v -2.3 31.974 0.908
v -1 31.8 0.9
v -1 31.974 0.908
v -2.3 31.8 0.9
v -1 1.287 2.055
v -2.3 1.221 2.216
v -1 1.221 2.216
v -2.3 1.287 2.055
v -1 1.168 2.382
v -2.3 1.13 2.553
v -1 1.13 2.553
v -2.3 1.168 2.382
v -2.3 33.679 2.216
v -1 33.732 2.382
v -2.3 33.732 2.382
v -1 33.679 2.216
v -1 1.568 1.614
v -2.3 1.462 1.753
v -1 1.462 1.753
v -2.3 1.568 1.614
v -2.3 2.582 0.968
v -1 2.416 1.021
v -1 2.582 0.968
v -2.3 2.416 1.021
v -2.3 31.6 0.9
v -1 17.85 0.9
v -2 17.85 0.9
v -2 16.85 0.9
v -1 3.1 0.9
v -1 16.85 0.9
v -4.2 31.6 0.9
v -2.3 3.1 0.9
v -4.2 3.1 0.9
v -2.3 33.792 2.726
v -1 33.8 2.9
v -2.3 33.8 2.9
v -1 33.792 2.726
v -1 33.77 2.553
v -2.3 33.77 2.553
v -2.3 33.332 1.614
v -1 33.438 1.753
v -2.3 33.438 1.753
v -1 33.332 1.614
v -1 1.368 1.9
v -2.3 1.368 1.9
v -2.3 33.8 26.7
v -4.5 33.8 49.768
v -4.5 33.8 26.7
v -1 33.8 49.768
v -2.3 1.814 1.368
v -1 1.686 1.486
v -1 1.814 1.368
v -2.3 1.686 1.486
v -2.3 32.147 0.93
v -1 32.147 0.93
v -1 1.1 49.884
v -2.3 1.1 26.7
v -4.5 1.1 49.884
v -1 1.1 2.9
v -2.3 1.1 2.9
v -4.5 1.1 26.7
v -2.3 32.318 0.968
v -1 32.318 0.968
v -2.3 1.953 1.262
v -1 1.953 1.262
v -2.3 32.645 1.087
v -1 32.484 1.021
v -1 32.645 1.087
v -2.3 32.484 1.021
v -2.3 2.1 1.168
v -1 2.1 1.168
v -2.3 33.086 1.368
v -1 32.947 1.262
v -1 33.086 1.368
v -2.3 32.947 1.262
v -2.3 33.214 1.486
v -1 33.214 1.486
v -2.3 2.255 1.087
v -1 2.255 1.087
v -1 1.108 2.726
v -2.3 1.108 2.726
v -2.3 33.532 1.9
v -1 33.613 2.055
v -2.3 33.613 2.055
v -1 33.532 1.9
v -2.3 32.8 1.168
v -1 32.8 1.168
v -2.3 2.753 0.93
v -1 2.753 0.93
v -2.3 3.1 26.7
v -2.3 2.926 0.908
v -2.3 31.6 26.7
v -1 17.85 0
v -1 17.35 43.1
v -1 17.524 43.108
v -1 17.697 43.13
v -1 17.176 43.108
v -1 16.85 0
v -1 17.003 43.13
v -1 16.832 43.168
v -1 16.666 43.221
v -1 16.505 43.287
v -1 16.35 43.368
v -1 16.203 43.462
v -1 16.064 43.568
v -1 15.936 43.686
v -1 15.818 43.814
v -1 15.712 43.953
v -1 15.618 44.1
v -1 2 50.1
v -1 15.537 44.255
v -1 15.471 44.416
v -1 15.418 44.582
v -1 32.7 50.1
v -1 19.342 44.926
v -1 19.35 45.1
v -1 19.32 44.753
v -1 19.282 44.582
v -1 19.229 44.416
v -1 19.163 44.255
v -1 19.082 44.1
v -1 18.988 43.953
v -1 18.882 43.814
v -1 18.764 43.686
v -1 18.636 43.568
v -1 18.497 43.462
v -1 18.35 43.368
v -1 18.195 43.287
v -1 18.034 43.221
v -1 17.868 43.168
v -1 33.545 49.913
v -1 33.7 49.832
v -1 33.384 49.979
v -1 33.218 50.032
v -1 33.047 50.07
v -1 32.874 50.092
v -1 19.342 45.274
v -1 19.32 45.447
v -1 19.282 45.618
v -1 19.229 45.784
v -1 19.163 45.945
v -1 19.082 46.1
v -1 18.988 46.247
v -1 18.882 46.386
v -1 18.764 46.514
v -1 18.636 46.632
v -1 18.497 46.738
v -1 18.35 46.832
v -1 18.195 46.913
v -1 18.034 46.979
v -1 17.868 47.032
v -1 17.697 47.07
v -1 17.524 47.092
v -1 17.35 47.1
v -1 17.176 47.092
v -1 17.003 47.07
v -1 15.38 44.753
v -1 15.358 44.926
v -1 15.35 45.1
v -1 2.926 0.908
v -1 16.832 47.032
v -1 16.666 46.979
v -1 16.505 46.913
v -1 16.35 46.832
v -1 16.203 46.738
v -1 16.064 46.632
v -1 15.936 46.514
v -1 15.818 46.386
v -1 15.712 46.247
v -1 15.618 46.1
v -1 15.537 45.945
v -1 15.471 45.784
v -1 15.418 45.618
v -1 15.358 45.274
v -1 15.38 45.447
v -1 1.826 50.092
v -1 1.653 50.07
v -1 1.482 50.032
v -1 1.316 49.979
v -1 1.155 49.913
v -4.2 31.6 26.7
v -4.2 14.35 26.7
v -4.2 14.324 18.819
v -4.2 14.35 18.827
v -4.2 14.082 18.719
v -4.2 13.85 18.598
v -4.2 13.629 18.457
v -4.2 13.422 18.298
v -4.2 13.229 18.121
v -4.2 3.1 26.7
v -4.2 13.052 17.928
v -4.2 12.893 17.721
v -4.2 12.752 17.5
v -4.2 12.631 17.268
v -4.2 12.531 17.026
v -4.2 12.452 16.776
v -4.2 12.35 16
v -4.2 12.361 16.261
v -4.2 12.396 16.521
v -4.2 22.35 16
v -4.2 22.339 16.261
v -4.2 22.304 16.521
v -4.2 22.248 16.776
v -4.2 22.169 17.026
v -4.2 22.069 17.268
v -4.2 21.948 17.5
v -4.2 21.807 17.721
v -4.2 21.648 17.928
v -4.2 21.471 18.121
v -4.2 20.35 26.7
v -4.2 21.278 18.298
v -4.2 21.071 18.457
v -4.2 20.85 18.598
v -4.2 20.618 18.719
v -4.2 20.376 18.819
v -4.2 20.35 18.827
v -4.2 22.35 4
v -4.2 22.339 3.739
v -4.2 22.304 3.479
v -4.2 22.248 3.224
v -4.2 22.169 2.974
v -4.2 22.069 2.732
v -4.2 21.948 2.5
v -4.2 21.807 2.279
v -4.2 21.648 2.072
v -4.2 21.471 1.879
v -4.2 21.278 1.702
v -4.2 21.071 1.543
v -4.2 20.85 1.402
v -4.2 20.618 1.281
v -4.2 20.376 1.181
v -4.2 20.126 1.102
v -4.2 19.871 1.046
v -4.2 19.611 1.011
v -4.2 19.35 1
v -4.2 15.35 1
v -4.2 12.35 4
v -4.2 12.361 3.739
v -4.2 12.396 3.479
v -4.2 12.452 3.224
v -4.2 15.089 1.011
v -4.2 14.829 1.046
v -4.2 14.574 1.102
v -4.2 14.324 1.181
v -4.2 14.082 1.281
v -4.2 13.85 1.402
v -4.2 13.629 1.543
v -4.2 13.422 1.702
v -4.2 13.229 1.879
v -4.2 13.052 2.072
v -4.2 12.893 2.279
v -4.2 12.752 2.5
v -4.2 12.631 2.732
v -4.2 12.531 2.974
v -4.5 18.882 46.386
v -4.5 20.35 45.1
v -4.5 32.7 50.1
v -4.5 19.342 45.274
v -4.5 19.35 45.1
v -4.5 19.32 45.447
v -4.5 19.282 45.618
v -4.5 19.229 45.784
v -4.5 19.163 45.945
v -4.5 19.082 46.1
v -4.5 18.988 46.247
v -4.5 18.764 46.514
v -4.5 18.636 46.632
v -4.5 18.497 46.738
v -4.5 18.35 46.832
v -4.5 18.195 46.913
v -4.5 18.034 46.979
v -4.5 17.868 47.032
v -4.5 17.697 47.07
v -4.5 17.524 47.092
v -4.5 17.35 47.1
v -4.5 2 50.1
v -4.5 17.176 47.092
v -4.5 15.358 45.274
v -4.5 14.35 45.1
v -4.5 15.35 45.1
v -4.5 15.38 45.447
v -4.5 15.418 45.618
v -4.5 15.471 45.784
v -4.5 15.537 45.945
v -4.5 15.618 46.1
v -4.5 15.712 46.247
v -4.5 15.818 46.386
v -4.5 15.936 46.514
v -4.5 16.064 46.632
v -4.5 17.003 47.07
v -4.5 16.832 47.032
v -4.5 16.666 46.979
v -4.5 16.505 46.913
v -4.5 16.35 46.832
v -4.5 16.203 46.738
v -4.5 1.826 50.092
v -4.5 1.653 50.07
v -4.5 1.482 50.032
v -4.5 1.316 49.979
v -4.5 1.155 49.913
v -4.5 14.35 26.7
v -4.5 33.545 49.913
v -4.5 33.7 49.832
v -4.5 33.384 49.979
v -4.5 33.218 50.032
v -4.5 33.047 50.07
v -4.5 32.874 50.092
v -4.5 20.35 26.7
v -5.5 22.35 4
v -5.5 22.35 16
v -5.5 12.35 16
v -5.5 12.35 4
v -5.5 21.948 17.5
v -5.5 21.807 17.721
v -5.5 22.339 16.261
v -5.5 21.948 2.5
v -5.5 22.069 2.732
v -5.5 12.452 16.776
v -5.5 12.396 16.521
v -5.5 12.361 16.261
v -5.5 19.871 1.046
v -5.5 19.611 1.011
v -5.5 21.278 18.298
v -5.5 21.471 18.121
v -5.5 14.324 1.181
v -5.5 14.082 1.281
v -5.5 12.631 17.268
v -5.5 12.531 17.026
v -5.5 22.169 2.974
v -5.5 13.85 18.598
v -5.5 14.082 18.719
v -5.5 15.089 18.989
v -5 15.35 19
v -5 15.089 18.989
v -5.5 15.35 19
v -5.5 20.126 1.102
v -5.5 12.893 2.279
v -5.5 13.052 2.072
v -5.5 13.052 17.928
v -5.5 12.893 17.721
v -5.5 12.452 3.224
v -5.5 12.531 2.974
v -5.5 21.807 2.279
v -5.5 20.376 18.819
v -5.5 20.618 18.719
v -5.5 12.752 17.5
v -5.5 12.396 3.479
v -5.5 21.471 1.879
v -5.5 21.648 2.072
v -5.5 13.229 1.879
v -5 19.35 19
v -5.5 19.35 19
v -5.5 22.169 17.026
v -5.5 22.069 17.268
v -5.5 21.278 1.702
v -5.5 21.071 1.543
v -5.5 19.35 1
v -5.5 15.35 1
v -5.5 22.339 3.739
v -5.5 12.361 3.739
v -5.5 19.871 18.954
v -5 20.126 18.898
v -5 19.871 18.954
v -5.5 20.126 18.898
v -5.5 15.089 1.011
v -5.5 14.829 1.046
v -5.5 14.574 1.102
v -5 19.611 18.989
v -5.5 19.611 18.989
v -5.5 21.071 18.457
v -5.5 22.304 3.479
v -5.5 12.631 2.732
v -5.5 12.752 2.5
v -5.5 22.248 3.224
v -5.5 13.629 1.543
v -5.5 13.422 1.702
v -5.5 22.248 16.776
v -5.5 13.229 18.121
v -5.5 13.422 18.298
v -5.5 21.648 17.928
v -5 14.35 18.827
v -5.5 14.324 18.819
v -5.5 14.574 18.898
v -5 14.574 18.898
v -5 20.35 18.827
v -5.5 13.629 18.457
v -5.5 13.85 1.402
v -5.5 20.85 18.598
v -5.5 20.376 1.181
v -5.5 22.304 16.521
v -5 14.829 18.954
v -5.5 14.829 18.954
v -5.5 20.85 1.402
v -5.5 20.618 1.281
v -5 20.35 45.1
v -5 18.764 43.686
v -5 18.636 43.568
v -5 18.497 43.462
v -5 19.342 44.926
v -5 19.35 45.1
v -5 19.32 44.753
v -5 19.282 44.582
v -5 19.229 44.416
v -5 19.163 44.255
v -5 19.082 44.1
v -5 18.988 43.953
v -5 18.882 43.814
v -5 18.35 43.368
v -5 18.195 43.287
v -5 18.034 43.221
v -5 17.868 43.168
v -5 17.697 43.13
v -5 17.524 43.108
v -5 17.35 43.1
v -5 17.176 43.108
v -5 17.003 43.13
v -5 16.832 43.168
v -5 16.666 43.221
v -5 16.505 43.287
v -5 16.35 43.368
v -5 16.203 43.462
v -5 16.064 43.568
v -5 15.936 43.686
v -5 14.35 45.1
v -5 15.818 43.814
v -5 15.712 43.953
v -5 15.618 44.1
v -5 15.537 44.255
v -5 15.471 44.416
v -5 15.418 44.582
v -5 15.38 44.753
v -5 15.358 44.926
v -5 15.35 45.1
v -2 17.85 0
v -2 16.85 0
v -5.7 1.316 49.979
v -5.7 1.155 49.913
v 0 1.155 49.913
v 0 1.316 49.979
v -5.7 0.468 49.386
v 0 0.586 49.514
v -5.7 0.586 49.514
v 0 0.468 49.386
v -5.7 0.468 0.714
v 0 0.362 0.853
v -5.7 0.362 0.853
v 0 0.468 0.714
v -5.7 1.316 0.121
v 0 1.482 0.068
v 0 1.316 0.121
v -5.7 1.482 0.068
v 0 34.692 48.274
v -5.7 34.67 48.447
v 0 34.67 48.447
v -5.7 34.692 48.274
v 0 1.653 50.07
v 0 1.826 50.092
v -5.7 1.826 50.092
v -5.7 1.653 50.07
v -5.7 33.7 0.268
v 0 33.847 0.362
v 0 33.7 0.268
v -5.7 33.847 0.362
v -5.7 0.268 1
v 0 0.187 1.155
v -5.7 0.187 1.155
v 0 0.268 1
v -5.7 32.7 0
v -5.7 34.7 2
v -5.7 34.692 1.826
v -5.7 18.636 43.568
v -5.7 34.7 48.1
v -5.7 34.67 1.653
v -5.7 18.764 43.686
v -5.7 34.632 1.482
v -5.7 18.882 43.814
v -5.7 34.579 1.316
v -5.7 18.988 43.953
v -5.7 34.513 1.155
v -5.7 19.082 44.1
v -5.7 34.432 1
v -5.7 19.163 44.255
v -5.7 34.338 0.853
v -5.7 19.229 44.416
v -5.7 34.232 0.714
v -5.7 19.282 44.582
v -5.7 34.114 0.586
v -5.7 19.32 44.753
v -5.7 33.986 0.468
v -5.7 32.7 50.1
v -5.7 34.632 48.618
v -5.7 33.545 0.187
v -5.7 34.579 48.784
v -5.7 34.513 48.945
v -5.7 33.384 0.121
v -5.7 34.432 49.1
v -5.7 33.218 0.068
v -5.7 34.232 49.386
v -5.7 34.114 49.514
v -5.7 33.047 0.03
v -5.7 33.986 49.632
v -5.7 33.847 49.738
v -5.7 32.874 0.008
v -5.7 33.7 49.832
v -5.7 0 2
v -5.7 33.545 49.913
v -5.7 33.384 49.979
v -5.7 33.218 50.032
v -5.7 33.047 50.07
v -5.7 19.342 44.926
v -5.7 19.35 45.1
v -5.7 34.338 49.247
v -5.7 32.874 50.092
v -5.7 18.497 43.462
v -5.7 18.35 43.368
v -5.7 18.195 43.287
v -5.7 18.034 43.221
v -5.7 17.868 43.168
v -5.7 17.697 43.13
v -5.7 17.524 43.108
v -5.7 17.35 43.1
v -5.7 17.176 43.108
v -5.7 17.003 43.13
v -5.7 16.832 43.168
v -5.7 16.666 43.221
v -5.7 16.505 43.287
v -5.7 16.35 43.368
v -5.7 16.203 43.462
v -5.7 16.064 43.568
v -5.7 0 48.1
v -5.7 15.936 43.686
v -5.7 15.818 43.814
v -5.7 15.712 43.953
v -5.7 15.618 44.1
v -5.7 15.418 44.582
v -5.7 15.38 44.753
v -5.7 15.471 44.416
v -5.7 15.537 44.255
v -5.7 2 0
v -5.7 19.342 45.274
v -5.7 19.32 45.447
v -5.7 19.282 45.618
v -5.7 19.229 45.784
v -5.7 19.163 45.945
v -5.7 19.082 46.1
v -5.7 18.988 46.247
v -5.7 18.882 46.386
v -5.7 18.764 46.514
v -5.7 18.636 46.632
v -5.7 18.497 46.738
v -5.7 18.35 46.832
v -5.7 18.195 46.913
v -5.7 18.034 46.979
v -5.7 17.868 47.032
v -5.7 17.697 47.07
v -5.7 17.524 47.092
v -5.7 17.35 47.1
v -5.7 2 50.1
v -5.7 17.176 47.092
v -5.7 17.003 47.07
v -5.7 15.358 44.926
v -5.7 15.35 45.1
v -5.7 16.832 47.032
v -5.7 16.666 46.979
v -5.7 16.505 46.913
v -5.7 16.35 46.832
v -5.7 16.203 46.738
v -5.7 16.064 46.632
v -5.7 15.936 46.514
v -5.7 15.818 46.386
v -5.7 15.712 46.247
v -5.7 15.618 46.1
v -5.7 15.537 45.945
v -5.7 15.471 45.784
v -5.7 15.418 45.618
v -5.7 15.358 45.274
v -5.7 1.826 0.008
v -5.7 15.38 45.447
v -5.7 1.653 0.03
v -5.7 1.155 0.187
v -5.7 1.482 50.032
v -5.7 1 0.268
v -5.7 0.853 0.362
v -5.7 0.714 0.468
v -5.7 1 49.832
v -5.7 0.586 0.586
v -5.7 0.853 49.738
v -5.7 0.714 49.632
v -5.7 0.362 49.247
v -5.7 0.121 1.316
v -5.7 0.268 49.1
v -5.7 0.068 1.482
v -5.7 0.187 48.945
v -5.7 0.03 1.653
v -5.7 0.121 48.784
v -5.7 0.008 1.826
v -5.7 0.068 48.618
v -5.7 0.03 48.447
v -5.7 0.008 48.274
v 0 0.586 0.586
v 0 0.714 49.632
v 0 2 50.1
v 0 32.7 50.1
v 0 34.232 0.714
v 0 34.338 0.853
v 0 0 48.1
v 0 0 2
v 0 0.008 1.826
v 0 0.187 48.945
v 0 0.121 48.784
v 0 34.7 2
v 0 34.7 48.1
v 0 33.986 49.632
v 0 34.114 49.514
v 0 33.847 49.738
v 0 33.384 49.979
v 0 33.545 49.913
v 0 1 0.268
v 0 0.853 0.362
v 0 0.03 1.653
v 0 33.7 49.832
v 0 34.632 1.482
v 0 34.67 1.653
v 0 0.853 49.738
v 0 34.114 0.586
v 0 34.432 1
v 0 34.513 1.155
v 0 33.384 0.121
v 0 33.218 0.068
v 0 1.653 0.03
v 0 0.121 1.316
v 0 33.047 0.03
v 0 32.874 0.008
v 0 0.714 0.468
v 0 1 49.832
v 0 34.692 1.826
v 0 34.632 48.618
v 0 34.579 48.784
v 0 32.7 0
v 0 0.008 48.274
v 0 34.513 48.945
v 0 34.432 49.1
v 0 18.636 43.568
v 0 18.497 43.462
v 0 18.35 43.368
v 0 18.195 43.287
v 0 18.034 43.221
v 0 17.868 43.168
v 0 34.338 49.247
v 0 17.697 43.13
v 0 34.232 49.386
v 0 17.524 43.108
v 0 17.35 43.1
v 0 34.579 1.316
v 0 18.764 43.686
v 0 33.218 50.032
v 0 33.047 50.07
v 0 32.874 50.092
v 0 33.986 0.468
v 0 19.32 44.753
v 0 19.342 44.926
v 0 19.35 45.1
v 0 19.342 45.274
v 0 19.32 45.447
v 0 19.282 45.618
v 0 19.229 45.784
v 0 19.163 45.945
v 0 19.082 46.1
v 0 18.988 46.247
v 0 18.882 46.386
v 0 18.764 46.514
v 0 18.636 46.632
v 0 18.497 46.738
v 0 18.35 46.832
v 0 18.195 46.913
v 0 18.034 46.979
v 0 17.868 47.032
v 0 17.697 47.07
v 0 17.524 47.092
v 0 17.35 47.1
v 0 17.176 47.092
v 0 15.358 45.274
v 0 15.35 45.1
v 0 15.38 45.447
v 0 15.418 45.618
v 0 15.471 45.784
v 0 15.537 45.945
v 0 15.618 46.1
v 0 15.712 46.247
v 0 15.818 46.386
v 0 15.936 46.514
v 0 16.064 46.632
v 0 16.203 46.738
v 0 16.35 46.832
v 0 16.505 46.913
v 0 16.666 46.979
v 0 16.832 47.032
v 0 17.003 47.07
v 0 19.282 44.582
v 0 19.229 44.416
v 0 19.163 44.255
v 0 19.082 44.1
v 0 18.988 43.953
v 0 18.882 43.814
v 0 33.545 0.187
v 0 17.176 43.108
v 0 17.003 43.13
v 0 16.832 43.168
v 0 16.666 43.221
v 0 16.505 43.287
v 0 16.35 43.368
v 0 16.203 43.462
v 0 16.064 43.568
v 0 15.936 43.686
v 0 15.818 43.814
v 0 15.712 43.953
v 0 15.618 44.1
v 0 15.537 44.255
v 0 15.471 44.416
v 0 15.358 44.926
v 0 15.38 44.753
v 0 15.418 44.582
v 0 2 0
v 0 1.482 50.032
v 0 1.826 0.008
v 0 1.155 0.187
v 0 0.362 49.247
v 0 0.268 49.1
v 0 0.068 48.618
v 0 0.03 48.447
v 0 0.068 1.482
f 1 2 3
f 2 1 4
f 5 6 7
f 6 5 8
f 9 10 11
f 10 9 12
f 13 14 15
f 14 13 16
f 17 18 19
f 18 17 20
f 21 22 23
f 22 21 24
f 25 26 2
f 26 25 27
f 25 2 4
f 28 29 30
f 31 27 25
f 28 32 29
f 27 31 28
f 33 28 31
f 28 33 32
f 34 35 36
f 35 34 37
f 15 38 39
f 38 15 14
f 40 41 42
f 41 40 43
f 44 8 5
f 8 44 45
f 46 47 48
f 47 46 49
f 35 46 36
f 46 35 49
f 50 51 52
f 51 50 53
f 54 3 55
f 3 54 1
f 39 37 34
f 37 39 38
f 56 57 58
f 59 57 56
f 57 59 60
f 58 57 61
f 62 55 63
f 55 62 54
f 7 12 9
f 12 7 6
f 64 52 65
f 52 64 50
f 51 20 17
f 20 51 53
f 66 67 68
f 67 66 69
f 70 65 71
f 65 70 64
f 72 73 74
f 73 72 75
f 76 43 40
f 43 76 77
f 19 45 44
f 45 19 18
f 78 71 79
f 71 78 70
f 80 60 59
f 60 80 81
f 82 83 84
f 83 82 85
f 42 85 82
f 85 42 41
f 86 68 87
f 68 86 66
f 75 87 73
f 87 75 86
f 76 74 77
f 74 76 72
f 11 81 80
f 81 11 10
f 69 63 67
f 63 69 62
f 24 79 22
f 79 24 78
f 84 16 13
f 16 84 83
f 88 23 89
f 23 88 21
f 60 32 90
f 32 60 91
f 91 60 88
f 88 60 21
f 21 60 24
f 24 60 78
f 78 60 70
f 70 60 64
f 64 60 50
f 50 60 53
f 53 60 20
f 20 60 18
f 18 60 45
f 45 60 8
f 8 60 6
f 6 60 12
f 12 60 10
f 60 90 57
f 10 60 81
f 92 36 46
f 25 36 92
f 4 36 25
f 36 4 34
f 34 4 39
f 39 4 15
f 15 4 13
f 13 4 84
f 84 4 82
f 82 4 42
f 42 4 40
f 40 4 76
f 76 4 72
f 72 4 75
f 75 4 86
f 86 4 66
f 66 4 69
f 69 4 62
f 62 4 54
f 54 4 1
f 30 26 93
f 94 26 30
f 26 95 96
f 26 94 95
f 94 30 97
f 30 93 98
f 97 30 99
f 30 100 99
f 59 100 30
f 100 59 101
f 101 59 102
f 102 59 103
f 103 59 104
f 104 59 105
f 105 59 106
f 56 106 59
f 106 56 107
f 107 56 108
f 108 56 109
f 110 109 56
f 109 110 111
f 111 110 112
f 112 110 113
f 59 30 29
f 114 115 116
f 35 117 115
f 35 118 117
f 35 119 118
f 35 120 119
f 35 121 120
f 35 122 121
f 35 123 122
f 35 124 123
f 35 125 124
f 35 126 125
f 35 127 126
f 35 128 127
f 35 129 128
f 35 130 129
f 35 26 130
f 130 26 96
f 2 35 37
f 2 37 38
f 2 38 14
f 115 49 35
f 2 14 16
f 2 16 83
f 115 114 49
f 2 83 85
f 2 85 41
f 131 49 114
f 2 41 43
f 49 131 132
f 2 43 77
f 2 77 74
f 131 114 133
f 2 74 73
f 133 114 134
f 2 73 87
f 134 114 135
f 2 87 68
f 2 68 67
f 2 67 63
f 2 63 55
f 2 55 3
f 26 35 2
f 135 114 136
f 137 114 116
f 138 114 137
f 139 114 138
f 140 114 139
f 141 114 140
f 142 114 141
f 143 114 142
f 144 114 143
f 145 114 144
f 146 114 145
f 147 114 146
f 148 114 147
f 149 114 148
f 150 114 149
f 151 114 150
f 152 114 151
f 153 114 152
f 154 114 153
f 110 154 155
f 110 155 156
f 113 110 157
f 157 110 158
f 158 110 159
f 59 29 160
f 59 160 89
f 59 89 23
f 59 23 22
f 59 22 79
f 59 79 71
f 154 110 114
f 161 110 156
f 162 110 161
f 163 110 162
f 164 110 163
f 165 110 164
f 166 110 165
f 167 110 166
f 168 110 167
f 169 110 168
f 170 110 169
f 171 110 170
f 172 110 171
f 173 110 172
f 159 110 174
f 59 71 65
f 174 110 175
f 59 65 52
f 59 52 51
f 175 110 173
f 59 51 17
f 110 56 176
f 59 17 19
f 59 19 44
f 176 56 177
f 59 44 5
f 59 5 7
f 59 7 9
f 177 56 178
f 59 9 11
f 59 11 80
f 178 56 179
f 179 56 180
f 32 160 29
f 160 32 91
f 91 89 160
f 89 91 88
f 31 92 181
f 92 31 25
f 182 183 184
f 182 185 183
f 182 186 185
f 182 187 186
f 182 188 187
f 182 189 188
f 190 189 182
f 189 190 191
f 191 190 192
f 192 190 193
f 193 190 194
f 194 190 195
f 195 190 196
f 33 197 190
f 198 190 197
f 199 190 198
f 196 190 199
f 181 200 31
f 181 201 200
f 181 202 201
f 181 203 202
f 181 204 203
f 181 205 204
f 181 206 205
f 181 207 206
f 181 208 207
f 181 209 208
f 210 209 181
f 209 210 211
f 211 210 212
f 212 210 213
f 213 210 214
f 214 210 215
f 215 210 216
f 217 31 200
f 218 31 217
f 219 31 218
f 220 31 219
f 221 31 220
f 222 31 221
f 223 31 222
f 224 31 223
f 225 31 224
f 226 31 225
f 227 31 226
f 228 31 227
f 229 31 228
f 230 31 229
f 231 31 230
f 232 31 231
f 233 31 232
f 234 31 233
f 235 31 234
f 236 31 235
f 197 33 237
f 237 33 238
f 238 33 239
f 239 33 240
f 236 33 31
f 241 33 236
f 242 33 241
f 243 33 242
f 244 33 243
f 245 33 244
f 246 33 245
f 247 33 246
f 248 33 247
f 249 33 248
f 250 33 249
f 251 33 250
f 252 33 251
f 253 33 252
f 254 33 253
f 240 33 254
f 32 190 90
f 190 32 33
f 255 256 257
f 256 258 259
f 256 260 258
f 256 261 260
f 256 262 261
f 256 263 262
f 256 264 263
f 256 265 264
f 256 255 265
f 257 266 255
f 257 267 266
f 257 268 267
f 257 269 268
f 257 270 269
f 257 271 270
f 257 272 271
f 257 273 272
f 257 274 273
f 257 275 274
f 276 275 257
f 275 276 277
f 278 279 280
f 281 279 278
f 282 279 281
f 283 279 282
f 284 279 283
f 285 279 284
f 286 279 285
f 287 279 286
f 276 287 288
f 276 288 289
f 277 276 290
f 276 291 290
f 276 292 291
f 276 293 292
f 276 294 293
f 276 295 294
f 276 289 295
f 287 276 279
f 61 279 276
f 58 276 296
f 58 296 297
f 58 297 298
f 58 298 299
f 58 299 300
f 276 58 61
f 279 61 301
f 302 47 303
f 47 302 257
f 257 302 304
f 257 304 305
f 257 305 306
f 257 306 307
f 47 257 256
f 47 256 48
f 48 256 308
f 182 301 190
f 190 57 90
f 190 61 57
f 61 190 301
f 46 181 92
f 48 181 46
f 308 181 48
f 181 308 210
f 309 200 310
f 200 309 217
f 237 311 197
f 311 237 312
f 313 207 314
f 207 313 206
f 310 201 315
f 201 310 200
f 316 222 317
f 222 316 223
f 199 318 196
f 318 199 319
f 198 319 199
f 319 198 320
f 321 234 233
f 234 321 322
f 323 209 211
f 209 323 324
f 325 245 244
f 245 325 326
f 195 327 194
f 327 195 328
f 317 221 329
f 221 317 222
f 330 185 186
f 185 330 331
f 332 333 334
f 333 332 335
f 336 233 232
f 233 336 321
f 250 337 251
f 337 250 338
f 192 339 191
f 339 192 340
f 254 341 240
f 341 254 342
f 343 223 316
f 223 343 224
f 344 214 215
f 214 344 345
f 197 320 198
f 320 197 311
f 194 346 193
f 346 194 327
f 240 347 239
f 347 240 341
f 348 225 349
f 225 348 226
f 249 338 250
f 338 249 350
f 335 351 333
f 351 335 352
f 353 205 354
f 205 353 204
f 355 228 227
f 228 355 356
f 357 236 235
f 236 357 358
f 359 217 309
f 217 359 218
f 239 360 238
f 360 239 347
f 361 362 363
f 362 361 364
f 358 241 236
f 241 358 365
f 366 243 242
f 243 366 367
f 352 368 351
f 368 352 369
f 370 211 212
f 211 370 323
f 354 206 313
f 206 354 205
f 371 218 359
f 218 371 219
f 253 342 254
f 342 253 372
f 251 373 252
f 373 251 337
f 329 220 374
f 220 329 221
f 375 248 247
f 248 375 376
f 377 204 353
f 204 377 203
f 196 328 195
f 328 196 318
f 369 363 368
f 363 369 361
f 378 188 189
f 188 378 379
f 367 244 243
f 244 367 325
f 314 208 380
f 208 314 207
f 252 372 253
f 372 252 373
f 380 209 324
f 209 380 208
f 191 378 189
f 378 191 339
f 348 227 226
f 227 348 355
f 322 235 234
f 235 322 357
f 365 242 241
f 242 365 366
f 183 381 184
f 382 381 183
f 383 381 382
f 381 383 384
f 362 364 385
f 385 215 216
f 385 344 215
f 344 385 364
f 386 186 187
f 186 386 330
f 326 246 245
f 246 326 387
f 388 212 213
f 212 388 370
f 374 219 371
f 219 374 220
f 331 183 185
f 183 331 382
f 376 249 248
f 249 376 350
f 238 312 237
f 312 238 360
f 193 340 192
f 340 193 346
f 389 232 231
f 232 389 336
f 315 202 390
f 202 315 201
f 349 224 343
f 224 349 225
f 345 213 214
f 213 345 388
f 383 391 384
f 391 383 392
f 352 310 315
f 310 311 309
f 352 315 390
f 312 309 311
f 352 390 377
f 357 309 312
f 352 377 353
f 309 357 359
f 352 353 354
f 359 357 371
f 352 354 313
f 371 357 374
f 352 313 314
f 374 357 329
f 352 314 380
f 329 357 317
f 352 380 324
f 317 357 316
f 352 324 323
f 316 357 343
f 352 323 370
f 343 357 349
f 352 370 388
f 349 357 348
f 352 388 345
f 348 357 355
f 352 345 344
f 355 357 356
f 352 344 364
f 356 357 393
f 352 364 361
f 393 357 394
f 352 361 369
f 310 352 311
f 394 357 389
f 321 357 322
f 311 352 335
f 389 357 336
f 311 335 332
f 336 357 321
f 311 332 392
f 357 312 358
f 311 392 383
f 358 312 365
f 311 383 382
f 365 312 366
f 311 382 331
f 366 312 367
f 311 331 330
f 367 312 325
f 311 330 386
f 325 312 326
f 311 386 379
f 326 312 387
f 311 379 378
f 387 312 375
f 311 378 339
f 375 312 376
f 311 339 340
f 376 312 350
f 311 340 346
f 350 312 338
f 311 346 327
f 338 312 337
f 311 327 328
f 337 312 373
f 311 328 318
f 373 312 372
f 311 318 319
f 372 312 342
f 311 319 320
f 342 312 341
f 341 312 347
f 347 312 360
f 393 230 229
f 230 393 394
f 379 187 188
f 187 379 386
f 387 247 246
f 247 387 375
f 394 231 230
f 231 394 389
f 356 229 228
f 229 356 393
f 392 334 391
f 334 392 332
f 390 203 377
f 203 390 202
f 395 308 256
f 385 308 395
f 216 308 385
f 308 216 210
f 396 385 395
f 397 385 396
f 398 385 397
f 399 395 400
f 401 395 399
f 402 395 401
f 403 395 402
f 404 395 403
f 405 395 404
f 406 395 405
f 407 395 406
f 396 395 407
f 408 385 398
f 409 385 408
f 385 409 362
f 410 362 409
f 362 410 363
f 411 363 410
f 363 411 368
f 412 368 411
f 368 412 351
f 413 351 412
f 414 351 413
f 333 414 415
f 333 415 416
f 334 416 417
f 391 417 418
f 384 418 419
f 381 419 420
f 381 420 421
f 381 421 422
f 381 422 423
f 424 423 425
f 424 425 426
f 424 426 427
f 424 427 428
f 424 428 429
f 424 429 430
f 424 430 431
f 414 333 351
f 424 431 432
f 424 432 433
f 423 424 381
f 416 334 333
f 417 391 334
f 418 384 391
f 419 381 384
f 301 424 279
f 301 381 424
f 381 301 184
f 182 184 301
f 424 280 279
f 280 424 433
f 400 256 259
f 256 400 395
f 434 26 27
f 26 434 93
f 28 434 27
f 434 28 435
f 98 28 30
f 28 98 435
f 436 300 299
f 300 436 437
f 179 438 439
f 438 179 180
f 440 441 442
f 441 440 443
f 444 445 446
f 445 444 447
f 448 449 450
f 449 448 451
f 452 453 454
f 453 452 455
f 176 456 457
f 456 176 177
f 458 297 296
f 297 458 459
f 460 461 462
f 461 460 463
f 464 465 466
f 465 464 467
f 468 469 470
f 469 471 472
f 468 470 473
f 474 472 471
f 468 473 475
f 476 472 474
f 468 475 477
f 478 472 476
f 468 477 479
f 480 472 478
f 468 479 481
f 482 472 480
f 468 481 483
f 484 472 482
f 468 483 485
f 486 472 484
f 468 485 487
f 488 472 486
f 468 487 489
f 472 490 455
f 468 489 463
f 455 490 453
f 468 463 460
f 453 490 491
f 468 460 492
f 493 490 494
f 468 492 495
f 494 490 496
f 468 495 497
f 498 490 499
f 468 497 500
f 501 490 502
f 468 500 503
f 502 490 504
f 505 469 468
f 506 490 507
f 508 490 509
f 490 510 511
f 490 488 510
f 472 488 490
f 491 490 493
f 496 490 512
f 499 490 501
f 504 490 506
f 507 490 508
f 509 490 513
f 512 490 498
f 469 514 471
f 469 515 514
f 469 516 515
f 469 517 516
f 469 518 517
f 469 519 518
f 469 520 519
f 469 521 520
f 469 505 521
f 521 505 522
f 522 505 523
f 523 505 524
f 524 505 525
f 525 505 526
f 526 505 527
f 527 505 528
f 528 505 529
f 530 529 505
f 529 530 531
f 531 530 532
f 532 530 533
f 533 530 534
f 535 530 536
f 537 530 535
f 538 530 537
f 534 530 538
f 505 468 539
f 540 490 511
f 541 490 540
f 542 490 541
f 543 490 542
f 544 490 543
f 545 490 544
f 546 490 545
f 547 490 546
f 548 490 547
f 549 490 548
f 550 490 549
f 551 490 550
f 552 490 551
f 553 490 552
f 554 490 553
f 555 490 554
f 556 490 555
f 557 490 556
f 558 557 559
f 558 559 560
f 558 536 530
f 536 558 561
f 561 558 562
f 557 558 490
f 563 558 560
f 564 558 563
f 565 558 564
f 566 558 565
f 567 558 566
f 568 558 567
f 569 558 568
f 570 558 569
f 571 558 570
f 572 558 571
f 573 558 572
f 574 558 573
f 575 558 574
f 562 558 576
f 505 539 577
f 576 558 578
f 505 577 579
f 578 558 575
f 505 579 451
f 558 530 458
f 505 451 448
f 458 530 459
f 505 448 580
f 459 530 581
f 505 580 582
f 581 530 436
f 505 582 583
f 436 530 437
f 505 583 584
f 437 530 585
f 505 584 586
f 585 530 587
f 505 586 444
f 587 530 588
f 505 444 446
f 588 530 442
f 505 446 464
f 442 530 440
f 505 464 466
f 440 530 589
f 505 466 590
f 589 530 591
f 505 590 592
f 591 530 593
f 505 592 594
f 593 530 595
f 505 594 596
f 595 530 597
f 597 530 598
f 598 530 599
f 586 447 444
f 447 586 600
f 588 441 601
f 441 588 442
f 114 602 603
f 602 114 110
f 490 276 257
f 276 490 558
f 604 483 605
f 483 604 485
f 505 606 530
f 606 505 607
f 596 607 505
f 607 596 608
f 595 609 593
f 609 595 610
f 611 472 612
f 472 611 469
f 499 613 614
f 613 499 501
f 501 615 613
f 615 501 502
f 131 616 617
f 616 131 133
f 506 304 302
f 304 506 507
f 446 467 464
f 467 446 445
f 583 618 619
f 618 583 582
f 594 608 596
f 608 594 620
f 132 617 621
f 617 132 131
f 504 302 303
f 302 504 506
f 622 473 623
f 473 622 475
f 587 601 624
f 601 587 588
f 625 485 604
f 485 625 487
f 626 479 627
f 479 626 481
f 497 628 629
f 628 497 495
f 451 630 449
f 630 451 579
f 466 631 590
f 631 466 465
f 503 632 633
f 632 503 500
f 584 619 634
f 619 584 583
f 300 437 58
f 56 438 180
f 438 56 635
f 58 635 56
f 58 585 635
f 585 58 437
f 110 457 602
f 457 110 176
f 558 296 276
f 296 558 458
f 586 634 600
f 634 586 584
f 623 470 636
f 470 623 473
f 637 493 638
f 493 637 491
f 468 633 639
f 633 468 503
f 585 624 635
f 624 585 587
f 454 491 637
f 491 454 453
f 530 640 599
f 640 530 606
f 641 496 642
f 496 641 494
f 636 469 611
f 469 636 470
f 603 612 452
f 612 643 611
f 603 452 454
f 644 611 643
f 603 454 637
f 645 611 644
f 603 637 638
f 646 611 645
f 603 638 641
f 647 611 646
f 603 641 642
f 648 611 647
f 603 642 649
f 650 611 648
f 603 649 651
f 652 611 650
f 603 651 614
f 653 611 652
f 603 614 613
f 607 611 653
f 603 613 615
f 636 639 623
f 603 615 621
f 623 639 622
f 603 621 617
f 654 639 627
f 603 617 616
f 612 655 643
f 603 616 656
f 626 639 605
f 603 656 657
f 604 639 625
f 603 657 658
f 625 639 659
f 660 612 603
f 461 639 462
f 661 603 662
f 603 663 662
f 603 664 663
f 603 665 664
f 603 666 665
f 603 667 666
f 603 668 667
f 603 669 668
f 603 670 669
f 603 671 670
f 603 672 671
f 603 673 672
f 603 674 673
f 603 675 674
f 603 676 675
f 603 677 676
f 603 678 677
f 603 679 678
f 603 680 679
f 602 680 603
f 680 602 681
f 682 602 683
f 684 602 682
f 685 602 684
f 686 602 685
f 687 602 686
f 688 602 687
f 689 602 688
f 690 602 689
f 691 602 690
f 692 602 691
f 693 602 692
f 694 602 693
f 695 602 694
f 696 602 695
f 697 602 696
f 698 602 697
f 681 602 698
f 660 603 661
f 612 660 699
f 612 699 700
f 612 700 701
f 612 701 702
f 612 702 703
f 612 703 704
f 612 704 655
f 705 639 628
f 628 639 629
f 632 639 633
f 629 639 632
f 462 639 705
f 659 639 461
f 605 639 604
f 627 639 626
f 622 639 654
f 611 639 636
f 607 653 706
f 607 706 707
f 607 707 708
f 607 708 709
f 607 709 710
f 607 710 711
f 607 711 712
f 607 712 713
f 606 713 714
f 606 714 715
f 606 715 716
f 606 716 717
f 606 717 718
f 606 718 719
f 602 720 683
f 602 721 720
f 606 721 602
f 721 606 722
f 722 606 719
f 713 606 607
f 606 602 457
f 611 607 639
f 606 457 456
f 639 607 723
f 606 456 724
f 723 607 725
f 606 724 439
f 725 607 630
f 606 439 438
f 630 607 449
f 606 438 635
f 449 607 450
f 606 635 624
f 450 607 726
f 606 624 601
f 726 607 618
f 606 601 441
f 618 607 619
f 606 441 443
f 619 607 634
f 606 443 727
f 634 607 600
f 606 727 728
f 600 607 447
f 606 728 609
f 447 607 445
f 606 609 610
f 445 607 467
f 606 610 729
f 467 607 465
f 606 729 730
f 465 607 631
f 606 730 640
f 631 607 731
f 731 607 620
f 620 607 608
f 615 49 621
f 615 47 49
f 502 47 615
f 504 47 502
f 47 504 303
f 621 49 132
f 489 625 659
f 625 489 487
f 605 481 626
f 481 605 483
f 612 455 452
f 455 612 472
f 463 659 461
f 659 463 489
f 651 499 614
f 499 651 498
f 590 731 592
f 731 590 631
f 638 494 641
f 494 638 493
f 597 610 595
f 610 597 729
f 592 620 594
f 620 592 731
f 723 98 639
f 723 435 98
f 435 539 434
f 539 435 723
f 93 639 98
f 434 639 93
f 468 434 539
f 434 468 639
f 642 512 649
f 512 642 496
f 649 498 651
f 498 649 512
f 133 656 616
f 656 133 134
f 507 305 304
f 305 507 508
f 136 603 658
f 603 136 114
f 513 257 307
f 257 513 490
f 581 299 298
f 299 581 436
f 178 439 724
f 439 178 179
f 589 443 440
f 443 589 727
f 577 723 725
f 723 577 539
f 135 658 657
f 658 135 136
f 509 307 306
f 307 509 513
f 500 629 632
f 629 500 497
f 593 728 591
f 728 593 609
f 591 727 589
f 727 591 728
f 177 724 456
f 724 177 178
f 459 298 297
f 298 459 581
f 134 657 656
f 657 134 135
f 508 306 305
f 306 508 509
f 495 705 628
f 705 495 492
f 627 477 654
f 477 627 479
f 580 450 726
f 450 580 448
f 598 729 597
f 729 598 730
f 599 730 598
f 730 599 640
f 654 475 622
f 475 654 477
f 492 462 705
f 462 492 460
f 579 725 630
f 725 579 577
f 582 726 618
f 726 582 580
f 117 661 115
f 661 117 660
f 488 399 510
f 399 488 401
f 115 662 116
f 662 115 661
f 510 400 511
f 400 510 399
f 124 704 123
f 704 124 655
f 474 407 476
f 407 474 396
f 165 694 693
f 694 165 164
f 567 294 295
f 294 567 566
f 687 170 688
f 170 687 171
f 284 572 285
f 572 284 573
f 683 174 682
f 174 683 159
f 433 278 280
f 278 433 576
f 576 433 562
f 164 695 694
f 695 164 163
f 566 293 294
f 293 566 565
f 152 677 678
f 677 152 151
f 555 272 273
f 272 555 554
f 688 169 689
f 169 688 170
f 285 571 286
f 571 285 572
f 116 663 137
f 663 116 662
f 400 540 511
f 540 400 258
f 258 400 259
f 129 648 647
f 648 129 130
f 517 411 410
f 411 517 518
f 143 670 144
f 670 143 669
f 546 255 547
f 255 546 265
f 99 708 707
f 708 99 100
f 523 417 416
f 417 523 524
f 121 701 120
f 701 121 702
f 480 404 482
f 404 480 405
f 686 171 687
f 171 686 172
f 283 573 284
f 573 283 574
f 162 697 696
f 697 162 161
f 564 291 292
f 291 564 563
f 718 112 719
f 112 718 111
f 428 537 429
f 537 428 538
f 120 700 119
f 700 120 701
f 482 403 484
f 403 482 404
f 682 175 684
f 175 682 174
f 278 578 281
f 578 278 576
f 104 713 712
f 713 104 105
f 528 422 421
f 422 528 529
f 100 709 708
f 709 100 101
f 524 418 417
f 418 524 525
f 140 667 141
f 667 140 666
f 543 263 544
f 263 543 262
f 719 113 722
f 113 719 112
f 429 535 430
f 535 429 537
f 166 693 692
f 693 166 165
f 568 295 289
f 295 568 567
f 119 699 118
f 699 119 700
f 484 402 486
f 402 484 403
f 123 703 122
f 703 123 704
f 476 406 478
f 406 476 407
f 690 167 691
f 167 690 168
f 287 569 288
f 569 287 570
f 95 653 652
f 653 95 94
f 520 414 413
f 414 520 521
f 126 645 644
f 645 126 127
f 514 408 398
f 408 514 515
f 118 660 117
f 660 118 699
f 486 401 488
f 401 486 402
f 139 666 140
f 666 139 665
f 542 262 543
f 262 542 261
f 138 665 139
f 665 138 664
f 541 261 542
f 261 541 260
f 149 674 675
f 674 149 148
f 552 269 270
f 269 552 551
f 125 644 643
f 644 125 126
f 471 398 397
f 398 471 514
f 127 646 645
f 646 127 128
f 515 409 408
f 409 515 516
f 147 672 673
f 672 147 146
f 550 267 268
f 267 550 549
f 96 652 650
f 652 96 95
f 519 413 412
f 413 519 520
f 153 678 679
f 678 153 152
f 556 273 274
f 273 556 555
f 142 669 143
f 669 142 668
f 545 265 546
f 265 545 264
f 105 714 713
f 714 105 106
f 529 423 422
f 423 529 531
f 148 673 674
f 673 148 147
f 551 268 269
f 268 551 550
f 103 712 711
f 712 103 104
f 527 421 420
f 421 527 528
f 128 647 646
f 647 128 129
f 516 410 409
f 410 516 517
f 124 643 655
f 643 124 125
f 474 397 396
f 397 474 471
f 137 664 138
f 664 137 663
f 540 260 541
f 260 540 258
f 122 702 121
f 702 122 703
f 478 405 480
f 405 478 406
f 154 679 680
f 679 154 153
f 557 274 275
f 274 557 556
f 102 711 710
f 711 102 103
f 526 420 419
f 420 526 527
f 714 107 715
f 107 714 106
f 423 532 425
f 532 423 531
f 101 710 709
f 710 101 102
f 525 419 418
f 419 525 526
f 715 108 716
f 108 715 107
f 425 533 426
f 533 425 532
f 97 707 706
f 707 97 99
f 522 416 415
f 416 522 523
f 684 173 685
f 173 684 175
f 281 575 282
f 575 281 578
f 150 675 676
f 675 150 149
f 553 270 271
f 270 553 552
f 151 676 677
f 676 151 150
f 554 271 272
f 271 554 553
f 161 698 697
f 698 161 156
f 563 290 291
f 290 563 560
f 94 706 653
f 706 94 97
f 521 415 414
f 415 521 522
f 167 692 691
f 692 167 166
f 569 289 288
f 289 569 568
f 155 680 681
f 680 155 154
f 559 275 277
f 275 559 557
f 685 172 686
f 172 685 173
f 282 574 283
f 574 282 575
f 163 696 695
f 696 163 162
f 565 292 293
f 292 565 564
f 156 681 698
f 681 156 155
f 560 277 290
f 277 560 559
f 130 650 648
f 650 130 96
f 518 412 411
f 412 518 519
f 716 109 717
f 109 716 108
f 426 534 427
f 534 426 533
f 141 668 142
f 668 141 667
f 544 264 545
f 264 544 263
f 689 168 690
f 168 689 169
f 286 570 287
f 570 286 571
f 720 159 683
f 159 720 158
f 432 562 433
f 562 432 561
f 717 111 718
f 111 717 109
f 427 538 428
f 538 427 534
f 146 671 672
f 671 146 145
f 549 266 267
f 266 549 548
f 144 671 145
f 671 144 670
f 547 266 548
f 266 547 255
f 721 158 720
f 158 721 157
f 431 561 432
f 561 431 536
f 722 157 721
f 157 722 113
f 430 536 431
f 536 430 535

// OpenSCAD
// Case for after market car alarm keyfob
//
// Copyright (C) 2022 Michiel Fokke <michiel@fokke.org>
//
// This program is free software: you can redistribute it and/or modify
// it under the terms of the GNU General Public License as published by
// the Free Software Foundation, either version 3 of the License, or
// (at your option) any later version.

// This program is distributed in the hope that it will be useful,
// but WITHOUT ANY WARRANTY; without even the implied warranty of
// MERCHANTABILITY or FITNESS FOR A PARTICULAR PURPOSE.  See the
// GNU General Public License for more details.

// You should have received a copy of the GNU General Public License
// along with this program.  If not, see <http://www.gnu.org/licenses/>.

$fn = 72;
TOL = .1;

PCB_X = 32.5;
PCB_Y = 39;
PCB_Z = 1.1;

Z_BATTERY = 3.5;
SLIT_X = 2;
Z_LED = 3;
BUTTON_X = 6; 
BUTTON_Y = 4; 
BUTTON_Z = 4;
BUTTON_Y_POSITION = 28;

BUTTON_CUTOUT_X = 10;
BUTTON_CUTOUT_Y = 18;
BUTTON_CUTOUT_Z = 5 - 5*TOL;
BUTTON_CORNER_R = 3;
LED_Y_POSITON = 3;
BATTERY_Y = 23.5;

CASE_KEYHOLE_Y = 10;
KEYHOLE_D = 4;

WALL_THICKNESS = 1;
CASE_X = PCB_X + 2*(WALL_THICKNESS + TOL);
CASE_Y = PCB_Y + CASE_KEYHOLE_Y + WALL_THICKNESS + TOL;
CASE_Z = Z_BATTERY + 2*(WALL_THICKNESS + TOL);
CASE_CORNER_R = 2;

module rounded_cube(x, r) {
    translate([r, r, 0])
        hull() {
            translate([0, 0, 0])
                cylinder(r=r, h=x[2]);
            translate([x[0] - 2*r, 0, 0])
                        cylinder(r=r, h=x[2]);
            translate([0, x[1] - 2*r, 0])
                        cylinder(r=r, h=x[2]);
            translate([x[0] - 2*r, x[1] - 2*r, 0])
                        cylinder(r=r, h=x[2]);
        }
}

module outer_case_hull() {
    rounded_cube([CASE_X, CASE_Y, CASE_Z], CASE_CORNER_R);
}

module pcb() {
    rounded_cube([PCB_X + 2*TOL, PCB_Y + CASE_KEYHOLE_Y + CASE_CORNER_R + 2*TOL, PCB_Z + 2*TOL], CASE_CORNER_R);
}

module component_cutout() {
    translate([SLIT_X, 0, 0])
    cube([PCB_X - 2*SLIT_X, PCB_Y + CASE_KEYHOLE_Y + CASE_CORNER_R + 2*TOL, Z_LED + 2*TOL]);
}

module battery_cutout() {
    translate([0, -TOL, 0])
    cube([PCB_X + 2*TOL, CASE_CORNER_R + BATTERY_Y, Z_BATTERY]);
}

module button_cutout(){
        rounded_cube([BUTTON_CUTOUT_X, BUTTON_CUTOUT_Y, BUTTON_CUTOUT_Z ], BUTTON_CORNER_R);
}

module button_cutout_2() {
    cube([BUTTON_X, BUTTON_Y_POSITION + BUTTON_Y - CASE_KEYHOLE_Y/2, BUTTON_Z]);
}

module punch_hole() {
    cube([WALL_THICKNESS, 2*WALL_THICKNESS, WALL_THICKNESS]);
}

module cutout() {
            translate([0, 0, WALL_THICKNESS])
        union() {
            translate([WALL_THICKNESS + TOL, -CASE_CORNER_R, 0]) {
                pcb();
                component_cutout();
                battery_cutout();
            }
            translate([(CASE_X - BUTTON_CUTOUT_X)/2, CASE_Y - BUTTON_CUTOUT_Y - WALL_THICKNESS, 0])
                button_cutout();
            translate([(CASE_X - BUTTON_X)/2, CASE_KEYHOLE_Y/2, 0])
                button_cutout_2();
            translate([(CASE_X - WALL_THICKNESS)/2, CASE_Y - WALL_THICKNESS, 0])
                punch_hole();
        }
}

module keyring_hole() {
        translate([CASE_X/2, CASE_KEYHOLE_Y/2, -TOL])
            cylinder(d=KEYHOLE_D, h=CASE_Z + 2*TOL);
}

module view_slicer() {
    translate([-10 + CASE_CORNER_R, -10, -10])
        cube([10, 100, 100]);
}

module keyfob_case() {
    difference() {
        outer_case_hull();
        keyring_hole();
        cutout();
        *view_slicer();
    }
}

translate([0, 0, CASE_Y])
   rotate([270, 0, 90])
        keyfob_case();
